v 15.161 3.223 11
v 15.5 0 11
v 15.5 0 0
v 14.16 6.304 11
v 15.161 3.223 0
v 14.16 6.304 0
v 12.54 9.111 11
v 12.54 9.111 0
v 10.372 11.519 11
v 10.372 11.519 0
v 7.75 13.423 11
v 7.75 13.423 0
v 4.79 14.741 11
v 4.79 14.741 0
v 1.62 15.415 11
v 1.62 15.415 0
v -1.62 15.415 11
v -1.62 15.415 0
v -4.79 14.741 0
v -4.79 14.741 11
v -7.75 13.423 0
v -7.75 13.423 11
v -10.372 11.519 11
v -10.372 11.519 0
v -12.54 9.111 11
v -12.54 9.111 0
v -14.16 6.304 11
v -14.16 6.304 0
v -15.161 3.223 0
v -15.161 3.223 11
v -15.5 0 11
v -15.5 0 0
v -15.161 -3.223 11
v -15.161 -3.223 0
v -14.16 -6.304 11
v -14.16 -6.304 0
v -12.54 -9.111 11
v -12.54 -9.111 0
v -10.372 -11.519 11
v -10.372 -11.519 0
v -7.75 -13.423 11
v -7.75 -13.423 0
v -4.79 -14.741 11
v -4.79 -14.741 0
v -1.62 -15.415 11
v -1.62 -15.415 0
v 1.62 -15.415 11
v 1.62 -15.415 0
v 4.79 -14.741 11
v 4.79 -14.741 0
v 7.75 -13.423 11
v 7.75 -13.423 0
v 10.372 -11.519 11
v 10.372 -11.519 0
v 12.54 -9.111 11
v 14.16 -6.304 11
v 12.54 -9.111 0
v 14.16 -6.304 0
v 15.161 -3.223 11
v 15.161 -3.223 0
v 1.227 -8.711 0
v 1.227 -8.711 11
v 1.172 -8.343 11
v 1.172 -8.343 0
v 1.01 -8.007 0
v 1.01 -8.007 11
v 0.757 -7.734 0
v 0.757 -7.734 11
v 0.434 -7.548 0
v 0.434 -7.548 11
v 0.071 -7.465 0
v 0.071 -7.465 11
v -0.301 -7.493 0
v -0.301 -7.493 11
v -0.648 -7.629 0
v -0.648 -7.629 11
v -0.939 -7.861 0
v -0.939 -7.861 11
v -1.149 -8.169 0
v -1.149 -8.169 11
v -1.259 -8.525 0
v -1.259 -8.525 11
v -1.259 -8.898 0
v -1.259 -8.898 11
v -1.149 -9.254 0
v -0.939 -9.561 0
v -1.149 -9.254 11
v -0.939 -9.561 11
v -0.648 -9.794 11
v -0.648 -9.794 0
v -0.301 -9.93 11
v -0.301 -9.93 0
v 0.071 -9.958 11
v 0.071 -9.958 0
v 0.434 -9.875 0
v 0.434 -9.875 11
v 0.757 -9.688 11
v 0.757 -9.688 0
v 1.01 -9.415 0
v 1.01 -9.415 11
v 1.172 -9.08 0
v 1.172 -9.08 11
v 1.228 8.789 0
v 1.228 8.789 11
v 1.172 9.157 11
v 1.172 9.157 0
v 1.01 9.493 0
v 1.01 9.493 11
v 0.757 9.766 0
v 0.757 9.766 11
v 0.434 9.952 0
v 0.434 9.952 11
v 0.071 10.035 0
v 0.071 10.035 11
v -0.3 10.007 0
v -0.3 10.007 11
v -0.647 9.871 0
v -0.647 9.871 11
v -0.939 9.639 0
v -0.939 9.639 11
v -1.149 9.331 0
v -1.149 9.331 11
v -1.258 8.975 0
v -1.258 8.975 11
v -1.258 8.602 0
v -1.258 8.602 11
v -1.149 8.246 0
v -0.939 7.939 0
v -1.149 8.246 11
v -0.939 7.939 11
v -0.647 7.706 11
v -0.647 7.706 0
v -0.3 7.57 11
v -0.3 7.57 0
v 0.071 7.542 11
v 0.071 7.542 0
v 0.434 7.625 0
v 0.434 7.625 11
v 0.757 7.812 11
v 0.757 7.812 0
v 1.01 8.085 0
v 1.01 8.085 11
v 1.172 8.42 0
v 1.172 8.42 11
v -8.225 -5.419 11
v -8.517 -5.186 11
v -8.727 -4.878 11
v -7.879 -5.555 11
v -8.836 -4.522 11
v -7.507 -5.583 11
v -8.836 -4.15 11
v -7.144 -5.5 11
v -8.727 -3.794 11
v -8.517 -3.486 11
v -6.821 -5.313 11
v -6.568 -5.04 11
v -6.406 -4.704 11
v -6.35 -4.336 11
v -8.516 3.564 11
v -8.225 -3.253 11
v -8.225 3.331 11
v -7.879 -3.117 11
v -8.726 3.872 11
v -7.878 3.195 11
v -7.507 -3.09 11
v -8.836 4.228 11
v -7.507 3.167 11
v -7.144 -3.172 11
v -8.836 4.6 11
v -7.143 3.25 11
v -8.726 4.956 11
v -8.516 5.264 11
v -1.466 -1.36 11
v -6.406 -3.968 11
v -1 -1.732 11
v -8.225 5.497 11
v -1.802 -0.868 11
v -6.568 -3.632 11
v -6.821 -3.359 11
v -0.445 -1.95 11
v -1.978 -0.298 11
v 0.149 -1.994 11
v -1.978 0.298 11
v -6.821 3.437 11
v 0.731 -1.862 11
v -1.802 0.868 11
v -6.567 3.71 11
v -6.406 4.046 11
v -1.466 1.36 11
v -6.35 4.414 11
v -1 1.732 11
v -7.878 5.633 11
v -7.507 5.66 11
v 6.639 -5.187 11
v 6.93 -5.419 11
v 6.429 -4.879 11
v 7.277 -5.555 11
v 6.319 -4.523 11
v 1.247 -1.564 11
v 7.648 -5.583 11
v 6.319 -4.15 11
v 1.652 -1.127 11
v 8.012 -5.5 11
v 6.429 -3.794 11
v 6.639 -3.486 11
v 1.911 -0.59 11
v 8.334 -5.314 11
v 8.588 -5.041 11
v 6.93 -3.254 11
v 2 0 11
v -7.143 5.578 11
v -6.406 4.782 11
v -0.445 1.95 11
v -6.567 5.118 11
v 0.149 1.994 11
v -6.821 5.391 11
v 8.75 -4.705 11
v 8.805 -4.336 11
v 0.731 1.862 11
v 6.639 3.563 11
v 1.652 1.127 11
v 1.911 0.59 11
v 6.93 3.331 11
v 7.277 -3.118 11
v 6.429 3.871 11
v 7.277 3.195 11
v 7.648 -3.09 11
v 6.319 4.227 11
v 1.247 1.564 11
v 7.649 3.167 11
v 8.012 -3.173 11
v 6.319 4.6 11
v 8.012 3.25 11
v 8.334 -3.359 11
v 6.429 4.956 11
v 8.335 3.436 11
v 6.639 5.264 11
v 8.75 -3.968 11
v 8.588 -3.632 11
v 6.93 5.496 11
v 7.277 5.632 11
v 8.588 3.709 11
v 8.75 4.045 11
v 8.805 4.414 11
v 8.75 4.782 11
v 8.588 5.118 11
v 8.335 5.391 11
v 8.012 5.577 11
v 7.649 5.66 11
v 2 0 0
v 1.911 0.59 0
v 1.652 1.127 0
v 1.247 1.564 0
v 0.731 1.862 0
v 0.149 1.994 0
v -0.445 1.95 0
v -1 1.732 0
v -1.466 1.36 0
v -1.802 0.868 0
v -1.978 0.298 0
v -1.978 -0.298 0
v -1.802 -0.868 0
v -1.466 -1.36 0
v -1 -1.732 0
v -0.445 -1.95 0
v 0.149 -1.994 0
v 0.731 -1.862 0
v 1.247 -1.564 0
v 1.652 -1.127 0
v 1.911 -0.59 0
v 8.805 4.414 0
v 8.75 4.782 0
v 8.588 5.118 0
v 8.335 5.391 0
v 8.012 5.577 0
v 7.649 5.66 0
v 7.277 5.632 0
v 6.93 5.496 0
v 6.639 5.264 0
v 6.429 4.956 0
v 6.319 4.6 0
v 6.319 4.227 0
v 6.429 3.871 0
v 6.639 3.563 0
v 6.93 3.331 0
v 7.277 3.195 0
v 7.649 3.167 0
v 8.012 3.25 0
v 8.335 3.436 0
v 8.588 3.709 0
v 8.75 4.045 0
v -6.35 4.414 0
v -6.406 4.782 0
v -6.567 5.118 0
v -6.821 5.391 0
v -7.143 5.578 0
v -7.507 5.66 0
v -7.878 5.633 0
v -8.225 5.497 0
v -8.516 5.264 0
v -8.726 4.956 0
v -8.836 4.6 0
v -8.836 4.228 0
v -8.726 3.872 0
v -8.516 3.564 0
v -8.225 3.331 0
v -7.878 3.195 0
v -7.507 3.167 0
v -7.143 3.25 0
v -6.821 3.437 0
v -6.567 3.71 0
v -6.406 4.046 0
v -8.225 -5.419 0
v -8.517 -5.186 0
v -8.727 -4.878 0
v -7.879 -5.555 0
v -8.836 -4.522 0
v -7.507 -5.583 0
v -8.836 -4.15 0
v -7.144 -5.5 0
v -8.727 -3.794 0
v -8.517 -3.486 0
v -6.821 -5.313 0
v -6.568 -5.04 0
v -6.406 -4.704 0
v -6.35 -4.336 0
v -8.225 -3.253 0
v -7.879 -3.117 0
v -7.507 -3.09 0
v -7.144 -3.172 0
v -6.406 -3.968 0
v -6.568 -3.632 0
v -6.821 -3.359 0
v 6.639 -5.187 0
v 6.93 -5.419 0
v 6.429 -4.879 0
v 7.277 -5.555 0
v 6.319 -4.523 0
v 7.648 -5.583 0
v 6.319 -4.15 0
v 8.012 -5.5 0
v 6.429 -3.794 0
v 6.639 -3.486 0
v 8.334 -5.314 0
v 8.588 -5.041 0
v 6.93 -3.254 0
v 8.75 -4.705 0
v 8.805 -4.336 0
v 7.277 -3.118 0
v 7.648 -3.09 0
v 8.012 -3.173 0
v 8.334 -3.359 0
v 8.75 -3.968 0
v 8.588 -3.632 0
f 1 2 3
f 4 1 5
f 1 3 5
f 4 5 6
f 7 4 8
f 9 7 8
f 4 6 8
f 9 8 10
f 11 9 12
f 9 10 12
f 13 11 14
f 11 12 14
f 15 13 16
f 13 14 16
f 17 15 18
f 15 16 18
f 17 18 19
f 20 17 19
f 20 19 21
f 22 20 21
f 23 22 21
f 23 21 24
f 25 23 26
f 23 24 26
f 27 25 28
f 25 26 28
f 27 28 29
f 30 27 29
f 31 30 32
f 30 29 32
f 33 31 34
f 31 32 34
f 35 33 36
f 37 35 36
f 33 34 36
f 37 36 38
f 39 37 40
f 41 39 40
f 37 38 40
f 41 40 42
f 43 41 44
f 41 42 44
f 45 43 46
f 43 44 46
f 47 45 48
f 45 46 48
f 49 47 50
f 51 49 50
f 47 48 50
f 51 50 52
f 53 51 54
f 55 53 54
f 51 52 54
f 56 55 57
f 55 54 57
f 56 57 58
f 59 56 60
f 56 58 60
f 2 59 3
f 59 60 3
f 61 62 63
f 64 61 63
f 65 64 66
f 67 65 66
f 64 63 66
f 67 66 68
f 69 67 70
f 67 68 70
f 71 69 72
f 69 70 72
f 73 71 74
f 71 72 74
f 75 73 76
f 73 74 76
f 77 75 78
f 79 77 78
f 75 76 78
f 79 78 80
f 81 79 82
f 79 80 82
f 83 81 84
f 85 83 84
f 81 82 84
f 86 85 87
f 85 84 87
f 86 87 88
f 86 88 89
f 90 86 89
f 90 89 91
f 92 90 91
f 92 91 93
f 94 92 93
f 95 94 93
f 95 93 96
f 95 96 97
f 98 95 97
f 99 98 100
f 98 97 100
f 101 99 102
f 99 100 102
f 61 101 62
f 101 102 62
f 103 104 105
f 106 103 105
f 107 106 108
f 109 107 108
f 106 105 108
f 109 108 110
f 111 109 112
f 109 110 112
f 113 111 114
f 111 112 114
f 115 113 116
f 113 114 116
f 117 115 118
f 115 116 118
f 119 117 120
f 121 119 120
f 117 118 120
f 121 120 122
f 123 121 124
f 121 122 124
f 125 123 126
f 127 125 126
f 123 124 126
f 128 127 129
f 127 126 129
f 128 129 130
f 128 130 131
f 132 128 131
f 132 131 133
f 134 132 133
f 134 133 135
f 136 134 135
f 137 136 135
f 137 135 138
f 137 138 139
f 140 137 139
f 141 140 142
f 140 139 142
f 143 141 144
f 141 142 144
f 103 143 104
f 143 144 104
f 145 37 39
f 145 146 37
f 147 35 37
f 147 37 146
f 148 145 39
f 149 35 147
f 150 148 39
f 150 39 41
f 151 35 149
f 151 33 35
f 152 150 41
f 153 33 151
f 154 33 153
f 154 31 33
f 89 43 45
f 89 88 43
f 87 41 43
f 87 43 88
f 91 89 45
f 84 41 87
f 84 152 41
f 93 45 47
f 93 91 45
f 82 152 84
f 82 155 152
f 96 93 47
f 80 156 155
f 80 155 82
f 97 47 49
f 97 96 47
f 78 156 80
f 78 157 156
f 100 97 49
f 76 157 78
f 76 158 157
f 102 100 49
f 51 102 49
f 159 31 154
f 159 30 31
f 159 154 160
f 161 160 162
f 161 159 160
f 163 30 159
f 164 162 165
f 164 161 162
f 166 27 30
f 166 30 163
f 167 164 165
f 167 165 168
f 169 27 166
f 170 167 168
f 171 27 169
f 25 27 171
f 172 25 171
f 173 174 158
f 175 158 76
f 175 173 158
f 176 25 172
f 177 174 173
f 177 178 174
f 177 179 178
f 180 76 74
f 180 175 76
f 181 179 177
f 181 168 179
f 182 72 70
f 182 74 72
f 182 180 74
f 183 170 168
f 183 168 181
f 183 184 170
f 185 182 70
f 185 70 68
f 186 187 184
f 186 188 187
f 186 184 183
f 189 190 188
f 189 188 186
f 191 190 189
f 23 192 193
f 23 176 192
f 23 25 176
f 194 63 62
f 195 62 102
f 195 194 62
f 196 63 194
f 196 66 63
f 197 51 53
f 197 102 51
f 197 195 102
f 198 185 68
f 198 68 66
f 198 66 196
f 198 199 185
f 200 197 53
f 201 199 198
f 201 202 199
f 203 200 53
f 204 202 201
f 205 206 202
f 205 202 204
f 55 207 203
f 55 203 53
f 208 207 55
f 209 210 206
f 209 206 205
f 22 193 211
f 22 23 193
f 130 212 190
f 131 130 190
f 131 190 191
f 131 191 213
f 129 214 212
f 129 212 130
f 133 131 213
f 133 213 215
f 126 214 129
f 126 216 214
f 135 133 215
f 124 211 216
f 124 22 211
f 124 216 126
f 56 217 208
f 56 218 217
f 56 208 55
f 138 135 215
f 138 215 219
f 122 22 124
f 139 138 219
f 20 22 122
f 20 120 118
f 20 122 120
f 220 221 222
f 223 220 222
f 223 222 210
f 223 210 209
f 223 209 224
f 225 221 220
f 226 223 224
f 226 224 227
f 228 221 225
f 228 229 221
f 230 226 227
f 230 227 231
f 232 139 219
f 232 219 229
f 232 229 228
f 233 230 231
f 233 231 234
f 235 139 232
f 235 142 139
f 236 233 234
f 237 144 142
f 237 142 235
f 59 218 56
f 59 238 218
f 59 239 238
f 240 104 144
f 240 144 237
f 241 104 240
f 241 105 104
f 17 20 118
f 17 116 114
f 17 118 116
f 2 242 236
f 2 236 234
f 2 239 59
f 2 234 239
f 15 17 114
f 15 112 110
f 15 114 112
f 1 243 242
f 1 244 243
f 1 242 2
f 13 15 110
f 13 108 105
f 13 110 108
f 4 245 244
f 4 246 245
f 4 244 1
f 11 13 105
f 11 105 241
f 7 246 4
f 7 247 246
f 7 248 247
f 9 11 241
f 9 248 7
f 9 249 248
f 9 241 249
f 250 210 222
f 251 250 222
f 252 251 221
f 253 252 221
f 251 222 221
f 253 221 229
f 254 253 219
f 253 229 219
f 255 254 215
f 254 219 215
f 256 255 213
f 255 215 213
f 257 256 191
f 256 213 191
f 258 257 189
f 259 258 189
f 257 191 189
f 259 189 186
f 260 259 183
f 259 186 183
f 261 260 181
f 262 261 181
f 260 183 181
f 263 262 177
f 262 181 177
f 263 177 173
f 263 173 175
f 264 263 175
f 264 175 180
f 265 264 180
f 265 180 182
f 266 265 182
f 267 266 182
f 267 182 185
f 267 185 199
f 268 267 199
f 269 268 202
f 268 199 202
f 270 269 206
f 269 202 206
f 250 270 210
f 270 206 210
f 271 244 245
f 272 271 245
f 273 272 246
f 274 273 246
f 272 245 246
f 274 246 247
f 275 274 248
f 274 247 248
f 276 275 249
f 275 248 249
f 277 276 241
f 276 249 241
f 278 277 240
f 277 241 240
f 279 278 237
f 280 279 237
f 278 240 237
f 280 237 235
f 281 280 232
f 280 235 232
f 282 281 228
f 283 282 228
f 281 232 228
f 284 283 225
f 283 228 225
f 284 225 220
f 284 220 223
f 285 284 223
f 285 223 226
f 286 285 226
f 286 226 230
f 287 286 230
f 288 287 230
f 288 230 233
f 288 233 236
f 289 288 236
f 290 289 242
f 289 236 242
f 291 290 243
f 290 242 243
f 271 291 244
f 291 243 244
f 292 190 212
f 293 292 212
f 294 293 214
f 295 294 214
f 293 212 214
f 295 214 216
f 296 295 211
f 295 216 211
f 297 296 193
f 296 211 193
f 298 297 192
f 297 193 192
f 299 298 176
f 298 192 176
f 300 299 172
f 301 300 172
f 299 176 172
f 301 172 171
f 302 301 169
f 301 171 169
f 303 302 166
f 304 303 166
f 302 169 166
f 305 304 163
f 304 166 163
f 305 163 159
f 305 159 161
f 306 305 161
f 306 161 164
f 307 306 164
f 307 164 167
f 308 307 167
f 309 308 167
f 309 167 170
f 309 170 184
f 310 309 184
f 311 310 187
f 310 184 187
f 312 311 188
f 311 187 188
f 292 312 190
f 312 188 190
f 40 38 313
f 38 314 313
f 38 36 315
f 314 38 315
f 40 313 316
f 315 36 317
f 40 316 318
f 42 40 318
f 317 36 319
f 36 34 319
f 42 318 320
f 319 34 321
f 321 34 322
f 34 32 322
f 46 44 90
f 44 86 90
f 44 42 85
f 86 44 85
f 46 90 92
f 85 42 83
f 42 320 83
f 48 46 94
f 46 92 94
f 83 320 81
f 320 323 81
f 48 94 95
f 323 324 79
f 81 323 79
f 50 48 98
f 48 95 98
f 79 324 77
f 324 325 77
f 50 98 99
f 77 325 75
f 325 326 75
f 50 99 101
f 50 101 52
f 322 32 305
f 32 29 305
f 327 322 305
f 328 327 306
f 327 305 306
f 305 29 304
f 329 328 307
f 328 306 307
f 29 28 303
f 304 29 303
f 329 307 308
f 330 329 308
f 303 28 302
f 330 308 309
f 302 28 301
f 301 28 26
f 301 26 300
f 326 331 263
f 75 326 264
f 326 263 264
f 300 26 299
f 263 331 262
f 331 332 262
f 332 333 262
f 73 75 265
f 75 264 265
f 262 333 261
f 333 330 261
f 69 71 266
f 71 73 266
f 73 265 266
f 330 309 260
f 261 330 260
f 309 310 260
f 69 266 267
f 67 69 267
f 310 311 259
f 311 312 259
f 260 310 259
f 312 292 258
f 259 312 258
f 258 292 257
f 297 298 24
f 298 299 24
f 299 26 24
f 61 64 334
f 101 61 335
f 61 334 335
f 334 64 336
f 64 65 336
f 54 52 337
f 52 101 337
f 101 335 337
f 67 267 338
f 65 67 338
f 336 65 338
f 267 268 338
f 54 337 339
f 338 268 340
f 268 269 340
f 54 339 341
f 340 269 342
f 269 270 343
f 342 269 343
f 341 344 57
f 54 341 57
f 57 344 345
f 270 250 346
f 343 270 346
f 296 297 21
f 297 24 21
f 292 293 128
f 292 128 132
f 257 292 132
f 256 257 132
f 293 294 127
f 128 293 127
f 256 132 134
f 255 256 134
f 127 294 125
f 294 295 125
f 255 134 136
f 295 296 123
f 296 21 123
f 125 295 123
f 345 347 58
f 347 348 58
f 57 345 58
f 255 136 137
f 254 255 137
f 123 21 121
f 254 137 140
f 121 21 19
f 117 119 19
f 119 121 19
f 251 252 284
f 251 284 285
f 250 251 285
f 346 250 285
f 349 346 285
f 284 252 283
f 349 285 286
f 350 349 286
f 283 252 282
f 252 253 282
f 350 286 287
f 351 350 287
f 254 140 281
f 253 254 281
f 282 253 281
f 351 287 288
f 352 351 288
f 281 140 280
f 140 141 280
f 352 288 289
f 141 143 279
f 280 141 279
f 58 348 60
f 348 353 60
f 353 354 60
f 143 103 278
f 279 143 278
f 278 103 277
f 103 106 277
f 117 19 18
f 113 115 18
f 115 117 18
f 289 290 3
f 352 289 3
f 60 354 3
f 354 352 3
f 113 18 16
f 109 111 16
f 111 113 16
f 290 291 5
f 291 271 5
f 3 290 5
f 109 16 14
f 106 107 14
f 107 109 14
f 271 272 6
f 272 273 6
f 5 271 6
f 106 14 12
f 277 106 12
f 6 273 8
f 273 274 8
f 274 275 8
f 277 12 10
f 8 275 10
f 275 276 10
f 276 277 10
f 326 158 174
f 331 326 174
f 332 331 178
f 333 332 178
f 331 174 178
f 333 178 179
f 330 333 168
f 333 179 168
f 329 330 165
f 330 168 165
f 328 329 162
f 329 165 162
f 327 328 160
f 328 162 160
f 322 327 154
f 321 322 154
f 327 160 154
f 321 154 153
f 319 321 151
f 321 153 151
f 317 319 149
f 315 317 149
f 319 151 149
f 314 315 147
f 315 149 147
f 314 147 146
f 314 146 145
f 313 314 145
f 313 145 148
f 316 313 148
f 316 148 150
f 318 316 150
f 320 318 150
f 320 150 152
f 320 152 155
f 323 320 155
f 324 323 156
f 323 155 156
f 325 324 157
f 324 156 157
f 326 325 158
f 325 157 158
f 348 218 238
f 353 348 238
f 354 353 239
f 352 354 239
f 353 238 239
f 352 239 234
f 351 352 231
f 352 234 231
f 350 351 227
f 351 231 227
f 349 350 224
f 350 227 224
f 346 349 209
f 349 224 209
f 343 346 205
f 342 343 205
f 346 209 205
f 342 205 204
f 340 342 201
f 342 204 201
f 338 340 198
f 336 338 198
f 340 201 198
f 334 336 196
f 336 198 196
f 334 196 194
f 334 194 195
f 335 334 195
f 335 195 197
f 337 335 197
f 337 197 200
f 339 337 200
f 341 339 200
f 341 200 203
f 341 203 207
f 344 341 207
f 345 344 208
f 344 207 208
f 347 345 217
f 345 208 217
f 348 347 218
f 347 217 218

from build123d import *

# Parameters (mm, degrees)
SKETCH1_R           = 15.5
BOSS_EXTRUDE1_DEPTH = 11
SKETCH2_R           = 2
SKETCH2_R_2         = 1.25
CUT_EXTRUDE1_DEPTH  = 11


with BuildPart() as part:
    # Sketch1 → Boss-Extrude1 (new body)
    with BuildSketch(Plane.XY):
        Circle(SKETCH1_R)
    extrude(amount=BOSS_EXTRUDE1_DEPTH)

    # Sketch2 → Cut-Extrude1 (cut)
    with BuildSketch(Plane.XY.offset(11)):
        Circle(SKETCH2_R)
        with Locations((7.555298175, 4.413611842)):
            Circle(SKETCH2_R_2)
        with Locations((7.555079083, -4.336388156)):
            Circle(SKETCH2_R_2)
        with Locations((-0.022752744, -8.711198415)):
            Circle(SKETCH2_R_2)
        with Locations((-7.600365479, -4.336008677)):
            Circle(SKETCH2_R_2)
        with Locations((-7.600146387, 4.413991321)):
            Circle(SKETCH2_R_2)
        with Locations((-0.02231456, 8.78880158)):
            Circle(SKETCH2_R_2)
    extrude(amount=-CUT_EXTRUDE1_DEPTH, mode=Mode.SUBTRACT)


solid = part.part
